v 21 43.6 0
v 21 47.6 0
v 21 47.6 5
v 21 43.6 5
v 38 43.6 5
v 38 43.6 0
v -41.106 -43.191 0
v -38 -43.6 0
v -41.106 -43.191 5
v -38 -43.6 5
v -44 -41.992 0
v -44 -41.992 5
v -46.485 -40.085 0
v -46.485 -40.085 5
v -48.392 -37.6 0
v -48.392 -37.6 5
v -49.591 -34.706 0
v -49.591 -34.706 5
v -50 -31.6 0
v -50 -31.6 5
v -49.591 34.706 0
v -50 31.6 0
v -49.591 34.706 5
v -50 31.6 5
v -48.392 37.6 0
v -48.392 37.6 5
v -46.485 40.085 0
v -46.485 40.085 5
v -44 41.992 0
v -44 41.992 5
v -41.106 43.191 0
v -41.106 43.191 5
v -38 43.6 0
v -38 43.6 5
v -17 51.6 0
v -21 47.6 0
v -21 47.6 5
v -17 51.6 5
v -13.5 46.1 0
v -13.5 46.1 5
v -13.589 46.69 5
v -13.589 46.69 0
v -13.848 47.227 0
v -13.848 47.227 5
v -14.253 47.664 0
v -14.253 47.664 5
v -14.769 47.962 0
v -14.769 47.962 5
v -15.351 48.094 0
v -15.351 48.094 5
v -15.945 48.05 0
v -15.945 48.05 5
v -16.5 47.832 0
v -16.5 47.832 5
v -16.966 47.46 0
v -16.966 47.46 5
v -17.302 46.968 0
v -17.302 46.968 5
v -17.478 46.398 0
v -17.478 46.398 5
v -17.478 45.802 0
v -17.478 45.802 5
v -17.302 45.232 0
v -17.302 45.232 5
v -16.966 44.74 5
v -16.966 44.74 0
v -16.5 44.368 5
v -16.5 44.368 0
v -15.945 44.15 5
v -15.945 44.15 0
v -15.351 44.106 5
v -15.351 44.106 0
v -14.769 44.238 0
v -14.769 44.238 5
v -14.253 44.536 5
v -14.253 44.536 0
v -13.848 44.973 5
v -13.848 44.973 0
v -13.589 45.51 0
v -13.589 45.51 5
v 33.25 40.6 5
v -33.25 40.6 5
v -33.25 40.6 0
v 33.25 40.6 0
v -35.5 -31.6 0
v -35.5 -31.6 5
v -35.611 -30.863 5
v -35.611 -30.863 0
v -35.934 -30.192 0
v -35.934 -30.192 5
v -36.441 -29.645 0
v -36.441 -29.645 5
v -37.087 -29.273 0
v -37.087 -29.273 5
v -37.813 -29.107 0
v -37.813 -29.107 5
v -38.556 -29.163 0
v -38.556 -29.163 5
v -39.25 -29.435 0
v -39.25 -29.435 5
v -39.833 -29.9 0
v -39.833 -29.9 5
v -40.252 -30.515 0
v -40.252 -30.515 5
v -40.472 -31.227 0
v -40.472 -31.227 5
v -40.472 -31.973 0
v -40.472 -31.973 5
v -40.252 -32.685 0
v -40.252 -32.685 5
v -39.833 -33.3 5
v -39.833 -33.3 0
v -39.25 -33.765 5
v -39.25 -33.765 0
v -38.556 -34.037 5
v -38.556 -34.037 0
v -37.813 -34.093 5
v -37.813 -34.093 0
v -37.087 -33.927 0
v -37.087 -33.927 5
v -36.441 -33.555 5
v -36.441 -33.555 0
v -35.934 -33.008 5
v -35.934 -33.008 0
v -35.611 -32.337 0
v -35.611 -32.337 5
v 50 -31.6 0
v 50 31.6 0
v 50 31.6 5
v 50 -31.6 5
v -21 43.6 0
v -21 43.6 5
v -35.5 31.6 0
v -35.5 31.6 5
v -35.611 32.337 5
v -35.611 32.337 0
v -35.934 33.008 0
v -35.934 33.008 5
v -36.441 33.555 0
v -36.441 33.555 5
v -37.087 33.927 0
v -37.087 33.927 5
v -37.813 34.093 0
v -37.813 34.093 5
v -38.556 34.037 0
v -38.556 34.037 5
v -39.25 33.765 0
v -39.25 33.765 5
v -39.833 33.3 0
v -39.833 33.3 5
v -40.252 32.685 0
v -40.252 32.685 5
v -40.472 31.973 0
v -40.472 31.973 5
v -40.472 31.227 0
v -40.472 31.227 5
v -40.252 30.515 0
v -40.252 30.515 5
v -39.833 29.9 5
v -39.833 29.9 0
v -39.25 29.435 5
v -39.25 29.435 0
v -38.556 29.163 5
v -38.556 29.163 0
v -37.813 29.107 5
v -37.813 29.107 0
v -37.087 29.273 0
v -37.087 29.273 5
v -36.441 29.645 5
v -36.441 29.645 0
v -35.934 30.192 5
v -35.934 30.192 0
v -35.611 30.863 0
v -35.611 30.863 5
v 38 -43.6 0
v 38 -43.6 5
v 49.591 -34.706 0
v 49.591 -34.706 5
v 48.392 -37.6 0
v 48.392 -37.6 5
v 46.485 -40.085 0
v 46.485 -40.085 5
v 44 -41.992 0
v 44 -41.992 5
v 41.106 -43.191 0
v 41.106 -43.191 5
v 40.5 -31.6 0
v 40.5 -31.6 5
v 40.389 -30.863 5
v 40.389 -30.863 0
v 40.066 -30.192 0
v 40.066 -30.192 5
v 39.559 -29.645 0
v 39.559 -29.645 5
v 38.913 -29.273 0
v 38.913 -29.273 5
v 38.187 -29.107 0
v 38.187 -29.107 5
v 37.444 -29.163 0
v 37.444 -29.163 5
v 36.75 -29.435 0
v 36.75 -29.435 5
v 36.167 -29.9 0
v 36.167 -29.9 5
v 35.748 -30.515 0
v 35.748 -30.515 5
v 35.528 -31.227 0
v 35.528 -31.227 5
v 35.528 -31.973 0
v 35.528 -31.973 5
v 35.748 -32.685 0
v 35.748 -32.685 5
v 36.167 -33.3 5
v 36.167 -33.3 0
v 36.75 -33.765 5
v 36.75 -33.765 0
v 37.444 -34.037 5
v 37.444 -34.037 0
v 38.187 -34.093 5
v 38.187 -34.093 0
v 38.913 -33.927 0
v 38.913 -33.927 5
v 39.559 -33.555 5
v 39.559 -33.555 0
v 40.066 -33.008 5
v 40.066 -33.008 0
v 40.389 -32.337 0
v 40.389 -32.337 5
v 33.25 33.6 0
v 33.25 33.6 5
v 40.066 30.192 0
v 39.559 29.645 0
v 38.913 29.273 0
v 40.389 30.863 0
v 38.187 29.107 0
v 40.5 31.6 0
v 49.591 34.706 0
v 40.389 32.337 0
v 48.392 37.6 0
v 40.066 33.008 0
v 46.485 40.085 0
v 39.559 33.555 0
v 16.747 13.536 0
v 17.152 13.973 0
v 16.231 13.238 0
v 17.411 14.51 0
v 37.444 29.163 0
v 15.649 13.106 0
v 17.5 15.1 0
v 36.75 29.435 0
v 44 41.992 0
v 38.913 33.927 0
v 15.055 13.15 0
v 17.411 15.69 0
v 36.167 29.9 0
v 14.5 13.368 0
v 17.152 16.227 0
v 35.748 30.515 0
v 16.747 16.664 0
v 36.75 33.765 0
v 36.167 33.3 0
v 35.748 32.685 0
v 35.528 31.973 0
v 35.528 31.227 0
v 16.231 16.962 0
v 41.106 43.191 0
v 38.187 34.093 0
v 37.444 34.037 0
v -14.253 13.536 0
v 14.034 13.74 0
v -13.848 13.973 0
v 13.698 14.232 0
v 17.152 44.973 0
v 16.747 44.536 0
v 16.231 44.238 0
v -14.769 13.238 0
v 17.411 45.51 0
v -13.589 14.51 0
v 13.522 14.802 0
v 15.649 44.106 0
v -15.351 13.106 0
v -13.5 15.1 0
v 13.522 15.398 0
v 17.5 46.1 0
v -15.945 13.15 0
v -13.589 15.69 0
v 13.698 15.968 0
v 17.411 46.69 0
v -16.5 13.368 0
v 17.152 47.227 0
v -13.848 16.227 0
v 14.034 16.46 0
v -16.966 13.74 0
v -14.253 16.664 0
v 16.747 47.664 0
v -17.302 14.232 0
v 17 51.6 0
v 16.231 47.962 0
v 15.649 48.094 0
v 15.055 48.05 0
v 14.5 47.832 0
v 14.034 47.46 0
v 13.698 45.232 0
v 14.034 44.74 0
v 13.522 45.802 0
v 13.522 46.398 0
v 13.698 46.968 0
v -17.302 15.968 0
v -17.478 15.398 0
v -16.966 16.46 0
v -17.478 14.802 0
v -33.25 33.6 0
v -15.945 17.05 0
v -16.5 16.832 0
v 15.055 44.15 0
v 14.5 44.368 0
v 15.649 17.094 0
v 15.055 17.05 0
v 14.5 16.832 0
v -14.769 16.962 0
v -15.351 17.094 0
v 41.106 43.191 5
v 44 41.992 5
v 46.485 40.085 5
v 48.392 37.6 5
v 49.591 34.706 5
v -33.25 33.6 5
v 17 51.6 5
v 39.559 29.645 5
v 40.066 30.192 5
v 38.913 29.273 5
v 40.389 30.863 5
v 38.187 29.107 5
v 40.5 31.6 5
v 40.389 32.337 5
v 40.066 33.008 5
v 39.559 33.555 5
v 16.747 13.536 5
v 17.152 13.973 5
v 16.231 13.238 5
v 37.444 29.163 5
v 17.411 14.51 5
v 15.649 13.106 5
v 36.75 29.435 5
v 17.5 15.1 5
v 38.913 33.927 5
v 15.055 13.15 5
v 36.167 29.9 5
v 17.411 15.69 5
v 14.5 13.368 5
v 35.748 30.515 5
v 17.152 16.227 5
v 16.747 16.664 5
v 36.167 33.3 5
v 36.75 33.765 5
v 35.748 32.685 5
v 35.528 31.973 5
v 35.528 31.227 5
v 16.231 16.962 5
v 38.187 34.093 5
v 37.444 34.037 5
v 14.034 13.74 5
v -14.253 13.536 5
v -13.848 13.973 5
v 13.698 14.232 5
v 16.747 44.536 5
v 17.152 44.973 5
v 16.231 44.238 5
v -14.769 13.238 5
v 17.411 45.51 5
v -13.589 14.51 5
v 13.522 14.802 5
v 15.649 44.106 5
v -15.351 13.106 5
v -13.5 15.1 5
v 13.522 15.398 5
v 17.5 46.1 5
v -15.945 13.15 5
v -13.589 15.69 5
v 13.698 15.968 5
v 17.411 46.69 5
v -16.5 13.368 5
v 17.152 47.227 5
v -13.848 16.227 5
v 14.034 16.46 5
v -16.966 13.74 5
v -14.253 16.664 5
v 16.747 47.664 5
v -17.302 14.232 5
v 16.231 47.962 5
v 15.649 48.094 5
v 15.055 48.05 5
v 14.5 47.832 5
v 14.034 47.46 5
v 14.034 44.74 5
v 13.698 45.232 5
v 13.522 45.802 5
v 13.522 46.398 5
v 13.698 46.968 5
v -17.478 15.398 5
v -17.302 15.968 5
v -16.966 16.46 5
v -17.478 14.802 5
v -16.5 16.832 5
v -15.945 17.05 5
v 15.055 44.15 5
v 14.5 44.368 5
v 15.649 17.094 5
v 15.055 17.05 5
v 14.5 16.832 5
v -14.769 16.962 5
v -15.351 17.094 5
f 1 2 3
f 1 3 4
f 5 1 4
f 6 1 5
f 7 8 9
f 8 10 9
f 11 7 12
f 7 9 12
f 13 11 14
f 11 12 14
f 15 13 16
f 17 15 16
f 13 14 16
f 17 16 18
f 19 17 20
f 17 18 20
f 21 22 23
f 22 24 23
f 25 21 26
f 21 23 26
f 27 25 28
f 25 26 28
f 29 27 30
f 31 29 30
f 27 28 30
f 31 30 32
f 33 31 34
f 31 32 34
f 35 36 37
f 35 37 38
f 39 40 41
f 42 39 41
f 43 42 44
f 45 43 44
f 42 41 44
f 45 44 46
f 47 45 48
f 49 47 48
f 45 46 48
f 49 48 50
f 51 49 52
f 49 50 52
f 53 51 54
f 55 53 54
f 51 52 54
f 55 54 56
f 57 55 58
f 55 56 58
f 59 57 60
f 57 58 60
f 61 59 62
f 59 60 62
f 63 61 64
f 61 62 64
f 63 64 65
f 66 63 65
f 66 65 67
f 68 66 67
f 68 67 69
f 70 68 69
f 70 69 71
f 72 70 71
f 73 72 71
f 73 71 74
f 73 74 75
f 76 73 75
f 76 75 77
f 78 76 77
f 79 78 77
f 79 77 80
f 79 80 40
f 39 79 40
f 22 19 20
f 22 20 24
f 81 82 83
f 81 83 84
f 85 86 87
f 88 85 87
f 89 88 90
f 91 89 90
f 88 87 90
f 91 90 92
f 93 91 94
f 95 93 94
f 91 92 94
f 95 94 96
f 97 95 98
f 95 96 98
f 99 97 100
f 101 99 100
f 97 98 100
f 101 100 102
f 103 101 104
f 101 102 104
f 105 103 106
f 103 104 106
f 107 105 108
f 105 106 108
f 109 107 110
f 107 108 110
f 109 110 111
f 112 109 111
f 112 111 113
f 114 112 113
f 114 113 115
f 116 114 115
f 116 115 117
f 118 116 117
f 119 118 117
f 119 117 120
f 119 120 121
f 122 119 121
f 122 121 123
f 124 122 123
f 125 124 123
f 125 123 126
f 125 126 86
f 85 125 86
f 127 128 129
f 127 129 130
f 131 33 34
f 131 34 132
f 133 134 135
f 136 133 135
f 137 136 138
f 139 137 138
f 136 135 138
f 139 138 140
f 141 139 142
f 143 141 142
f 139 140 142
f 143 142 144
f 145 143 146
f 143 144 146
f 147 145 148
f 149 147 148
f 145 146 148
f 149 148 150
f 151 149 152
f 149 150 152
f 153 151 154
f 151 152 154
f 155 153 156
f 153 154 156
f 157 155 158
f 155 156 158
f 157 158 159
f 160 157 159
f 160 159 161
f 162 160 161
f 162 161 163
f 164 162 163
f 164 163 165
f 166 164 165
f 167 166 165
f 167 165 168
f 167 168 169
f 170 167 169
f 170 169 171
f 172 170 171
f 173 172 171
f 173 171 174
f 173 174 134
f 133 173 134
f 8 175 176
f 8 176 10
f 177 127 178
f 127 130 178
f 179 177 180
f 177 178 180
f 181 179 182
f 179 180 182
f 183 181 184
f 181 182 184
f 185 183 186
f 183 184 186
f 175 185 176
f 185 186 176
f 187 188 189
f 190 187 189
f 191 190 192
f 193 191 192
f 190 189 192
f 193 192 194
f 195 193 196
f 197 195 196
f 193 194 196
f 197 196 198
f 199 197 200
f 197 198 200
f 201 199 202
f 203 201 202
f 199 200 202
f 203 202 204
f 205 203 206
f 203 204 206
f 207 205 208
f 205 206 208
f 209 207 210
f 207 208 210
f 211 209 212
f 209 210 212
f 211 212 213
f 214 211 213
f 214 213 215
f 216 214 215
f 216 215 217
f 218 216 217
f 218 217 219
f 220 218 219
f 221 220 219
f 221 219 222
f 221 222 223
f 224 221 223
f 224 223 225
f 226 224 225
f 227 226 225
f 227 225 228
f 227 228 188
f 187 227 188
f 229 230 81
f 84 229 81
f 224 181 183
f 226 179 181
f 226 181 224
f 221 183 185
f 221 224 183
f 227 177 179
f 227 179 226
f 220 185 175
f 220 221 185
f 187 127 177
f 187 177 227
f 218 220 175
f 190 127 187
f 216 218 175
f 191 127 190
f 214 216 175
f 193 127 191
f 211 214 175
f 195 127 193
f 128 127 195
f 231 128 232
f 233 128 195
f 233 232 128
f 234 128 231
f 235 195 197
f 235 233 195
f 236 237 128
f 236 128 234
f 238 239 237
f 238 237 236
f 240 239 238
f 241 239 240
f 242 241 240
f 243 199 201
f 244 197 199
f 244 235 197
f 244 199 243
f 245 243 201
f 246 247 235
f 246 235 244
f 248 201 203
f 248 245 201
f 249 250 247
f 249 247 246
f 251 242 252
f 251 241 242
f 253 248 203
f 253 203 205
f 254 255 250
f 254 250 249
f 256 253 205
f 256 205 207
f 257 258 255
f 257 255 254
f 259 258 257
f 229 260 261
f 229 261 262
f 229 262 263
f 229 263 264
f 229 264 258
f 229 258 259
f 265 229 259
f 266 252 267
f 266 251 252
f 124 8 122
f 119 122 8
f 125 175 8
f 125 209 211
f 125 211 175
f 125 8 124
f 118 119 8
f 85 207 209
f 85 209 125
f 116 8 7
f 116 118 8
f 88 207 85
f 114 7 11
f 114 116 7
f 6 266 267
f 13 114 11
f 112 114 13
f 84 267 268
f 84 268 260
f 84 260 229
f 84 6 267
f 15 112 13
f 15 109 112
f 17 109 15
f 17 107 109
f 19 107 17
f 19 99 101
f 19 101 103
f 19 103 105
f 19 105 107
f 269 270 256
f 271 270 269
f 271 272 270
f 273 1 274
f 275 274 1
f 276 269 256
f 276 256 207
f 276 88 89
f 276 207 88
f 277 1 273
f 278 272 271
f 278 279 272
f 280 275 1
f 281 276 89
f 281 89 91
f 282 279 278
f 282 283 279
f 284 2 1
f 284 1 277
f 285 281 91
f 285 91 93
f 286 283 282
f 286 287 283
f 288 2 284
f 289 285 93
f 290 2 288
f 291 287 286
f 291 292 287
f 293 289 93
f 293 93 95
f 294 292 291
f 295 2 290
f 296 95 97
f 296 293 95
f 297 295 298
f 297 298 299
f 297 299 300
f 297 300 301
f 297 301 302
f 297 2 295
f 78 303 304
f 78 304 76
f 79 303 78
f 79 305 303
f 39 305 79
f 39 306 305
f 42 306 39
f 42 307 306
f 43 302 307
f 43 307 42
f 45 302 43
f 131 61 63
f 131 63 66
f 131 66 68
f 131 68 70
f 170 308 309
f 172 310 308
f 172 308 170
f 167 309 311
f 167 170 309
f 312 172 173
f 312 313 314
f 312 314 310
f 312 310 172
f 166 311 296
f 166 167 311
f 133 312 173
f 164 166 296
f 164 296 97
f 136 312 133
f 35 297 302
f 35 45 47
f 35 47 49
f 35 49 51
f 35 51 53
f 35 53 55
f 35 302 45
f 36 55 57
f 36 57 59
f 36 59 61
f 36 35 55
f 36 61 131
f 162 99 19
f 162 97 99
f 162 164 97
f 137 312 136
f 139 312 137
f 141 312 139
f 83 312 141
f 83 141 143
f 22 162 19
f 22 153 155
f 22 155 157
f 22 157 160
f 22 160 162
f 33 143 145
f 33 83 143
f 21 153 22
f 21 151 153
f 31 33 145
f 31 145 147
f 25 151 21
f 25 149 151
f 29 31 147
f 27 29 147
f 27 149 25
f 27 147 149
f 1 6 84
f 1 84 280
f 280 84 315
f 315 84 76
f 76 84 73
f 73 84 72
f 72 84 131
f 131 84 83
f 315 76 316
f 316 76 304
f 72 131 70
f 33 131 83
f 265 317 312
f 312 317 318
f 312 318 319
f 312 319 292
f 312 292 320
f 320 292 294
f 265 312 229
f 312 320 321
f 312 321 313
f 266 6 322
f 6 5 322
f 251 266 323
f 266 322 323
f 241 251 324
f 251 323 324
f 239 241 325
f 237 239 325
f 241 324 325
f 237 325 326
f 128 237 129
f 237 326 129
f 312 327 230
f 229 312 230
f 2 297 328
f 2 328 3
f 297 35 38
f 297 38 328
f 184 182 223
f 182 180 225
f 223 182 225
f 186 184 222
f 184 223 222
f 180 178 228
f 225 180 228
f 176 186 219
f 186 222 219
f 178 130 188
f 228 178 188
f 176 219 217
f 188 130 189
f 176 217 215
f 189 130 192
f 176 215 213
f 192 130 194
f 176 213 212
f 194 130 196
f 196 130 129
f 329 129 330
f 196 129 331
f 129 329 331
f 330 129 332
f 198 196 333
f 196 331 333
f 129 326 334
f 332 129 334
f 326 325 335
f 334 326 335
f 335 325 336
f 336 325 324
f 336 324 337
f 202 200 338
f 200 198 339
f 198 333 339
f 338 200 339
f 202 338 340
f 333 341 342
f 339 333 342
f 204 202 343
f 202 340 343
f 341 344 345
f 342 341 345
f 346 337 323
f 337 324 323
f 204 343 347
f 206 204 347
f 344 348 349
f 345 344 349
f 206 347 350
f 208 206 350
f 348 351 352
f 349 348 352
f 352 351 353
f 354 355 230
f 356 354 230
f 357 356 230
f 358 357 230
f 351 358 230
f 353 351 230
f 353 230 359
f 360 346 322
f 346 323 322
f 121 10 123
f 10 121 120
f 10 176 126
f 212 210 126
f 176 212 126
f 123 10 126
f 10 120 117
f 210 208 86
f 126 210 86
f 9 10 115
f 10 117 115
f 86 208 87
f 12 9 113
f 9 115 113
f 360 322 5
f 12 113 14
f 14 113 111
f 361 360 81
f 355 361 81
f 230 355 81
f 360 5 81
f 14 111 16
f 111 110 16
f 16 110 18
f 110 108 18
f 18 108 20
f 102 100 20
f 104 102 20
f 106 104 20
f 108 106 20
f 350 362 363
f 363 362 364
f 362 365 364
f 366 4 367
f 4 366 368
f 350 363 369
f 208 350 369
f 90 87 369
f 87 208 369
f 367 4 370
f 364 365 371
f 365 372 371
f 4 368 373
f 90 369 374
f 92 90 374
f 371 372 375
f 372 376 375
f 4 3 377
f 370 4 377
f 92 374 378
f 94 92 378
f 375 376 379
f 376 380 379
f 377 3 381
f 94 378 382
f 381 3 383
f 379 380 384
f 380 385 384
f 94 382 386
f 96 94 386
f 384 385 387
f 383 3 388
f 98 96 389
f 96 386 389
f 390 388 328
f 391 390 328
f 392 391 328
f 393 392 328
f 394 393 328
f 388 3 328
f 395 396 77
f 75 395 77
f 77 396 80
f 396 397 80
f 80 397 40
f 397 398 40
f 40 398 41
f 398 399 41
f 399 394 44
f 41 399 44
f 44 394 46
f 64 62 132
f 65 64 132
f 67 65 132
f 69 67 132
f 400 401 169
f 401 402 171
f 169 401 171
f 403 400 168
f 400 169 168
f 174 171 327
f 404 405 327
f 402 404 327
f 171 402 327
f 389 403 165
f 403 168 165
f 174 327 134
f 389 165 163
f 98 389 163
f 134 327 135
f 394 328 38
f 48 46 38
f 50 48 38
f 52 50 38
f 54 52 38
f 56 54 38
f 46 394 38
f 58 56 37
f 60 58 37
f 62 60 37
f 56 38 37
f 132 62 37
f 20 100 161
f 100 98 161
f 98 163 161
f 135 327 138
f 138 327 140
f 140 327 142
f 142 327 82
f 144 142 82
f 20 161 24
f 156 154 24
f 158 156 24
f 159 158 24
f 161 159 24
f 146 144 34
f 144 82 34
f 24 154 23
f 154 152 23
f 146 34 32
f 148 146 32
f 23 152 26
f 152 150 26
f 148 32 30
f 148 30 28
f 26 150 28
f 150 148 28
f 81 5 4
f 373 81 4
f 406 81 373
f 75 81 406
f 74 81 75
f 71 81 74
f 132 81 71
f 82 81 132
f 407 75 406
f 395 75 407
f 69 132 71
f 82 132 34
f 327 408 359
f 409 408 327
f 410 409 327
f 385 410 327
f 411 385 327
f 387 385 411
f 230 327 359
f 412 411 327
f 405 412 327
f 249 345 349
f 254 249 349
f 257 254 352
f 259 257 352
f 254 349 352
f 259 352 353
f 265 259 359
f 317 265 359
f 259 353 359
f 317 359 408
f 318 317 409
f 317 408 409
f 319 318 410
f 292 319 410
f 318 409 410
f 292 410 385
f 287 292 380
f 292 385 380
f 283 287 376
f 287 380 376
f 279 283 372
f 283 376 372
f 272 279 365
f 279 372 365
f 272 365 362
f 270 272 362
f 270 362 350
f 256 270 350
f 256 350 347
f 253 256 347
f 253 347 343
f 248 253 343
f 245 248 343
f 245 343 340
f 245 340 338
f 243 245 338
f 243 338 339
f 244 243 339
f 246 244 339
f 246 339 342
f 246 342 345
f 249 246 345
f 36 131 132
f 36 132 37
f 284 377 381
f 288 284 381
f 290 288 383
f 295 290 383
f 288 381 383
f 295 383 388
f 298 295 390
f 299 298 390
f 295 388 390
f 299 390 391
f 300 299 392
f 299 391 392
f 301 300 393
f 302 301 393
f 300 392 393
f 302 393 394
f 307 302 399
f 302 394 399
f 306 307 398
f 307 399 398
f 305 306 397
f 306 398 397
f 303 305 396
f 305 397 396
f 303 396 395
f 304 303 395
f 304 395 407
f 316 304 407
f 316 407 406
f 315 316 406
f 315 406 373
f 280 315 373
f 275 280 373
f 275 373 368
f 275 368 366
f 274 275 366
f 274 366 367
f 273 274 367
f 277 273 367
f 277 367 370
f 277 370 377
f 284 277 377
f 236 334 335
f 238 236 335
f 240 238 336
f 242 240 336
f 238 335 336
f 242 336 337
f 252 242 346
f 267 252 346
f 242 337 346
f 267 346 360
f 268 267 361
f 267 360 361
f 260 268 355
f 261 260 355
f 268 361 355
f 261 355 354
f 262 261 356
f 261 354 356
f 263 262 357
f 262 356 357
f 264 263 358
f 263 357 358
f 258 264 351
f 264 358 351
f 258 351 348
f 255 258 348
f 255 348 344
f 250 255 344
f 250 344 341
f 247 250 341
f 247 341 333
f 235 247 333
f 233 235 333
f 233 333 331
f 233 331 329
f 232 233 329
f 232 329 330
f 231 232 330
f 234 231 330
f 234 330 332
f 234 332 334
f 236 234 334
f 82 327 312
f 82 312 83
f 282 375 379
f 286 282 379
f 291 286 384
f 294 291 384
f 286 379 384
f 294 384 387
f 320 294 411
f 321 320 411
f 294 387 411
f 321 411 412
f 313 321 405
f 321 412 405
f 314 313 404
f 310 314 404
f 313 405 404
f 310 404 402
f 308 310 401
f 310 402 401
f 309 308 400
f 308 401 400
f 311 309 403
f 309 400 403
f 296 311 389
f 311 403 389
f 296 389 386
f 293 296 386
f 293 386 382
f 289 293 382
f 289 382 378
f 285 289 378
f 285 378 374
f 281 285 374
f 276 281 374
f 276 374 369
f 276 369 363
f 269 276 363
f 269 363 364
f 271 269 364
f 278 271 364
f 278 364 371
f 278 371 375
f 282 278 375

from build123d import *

# Parameters (mm, degrees)
Y_KSEKLIK_EKSTR_ZYON1_DEPTH = 5
IZIM2_R                     = 2.5
IZIM2_R_2                   = 2
KES_EKSTR_ZYON1_DEPTH       = 10
IZIM4_W                     = 66.5
IZIM4_H                     = 7
KES_EKSTR_ZYON3_DEPTH       = 5
RADYUS1_R                   = 12


with BuildPart() as part:
    # Çizim1 → Yükseklik-Ekstrüzyon1 (new body)
    with BuildSketch(Plane.XY):
        Polygon((21, 43.6), (50, 43.6), (50, -43.6), (-50, -43.6), (-50, 43.6), (-21, 43.6), (-21, 47.6), (-17, 51.6), (17, 51.6), (21, 47.6), align=None)
    extrude(amount=Y_KSEKLIK_EKSTR_ZYON1_DEPTH)

    # Çizim2 → Kes-Ekstrüzyon1 (cut)
    with BuildSketch(Plane.XY.offset(5)):
        with Locations((38, -31.6)):
            Circle(IZIM2_R)
        with Locations((38, 31.6)):
            Circle(IZIM2_R)
        with Locations((-15.5, 46.1)):
            Circle(IZIM2_R_2)
        with Locations((15.5, 46.1)):
            Circle(IZIM2_R_2)
        with Locations((15.5, 15.1)):
            Circle(IZIM2_R_2)
        with Locations((-15.5, 15.1)):
            Circle(IZIM2_R_2)
        with Locations((-38, 31.6)):
            Circle(IZIM2_R)
        with Locations((-38, -31.6)):
            Circle(IZIM2_R)
    extrude(amount=-KES_EKSTR_ZYON1_DEPTH, mode=Mode.SUBTRACT)

    # Çizim4 → Kes-Ekstrüzyon3 (cut)
    with BuildSketch(Plane.XY.offset(5)):
        with Locations((0, 37.1)):
            Rectangle(IZIM4_W, IZIM4_H)
    extrude(amount=-KES_EKSTR_ZYON3_DEPTH, mode=Mode.SUBTRACT)

    # Radyus1
    radyus1_edges = [part.edges().sort_by_distance(p)[0] for p in [
        (50, -43.6, 2.5),
        (-50, -43.6, 2.5),
        (-50, 43.6, 2.5),
        (50, 43.6, 2.5),
    ]]
    fillet(radyus1_edges, radius=RADYUS1_R)


solid = part.part
